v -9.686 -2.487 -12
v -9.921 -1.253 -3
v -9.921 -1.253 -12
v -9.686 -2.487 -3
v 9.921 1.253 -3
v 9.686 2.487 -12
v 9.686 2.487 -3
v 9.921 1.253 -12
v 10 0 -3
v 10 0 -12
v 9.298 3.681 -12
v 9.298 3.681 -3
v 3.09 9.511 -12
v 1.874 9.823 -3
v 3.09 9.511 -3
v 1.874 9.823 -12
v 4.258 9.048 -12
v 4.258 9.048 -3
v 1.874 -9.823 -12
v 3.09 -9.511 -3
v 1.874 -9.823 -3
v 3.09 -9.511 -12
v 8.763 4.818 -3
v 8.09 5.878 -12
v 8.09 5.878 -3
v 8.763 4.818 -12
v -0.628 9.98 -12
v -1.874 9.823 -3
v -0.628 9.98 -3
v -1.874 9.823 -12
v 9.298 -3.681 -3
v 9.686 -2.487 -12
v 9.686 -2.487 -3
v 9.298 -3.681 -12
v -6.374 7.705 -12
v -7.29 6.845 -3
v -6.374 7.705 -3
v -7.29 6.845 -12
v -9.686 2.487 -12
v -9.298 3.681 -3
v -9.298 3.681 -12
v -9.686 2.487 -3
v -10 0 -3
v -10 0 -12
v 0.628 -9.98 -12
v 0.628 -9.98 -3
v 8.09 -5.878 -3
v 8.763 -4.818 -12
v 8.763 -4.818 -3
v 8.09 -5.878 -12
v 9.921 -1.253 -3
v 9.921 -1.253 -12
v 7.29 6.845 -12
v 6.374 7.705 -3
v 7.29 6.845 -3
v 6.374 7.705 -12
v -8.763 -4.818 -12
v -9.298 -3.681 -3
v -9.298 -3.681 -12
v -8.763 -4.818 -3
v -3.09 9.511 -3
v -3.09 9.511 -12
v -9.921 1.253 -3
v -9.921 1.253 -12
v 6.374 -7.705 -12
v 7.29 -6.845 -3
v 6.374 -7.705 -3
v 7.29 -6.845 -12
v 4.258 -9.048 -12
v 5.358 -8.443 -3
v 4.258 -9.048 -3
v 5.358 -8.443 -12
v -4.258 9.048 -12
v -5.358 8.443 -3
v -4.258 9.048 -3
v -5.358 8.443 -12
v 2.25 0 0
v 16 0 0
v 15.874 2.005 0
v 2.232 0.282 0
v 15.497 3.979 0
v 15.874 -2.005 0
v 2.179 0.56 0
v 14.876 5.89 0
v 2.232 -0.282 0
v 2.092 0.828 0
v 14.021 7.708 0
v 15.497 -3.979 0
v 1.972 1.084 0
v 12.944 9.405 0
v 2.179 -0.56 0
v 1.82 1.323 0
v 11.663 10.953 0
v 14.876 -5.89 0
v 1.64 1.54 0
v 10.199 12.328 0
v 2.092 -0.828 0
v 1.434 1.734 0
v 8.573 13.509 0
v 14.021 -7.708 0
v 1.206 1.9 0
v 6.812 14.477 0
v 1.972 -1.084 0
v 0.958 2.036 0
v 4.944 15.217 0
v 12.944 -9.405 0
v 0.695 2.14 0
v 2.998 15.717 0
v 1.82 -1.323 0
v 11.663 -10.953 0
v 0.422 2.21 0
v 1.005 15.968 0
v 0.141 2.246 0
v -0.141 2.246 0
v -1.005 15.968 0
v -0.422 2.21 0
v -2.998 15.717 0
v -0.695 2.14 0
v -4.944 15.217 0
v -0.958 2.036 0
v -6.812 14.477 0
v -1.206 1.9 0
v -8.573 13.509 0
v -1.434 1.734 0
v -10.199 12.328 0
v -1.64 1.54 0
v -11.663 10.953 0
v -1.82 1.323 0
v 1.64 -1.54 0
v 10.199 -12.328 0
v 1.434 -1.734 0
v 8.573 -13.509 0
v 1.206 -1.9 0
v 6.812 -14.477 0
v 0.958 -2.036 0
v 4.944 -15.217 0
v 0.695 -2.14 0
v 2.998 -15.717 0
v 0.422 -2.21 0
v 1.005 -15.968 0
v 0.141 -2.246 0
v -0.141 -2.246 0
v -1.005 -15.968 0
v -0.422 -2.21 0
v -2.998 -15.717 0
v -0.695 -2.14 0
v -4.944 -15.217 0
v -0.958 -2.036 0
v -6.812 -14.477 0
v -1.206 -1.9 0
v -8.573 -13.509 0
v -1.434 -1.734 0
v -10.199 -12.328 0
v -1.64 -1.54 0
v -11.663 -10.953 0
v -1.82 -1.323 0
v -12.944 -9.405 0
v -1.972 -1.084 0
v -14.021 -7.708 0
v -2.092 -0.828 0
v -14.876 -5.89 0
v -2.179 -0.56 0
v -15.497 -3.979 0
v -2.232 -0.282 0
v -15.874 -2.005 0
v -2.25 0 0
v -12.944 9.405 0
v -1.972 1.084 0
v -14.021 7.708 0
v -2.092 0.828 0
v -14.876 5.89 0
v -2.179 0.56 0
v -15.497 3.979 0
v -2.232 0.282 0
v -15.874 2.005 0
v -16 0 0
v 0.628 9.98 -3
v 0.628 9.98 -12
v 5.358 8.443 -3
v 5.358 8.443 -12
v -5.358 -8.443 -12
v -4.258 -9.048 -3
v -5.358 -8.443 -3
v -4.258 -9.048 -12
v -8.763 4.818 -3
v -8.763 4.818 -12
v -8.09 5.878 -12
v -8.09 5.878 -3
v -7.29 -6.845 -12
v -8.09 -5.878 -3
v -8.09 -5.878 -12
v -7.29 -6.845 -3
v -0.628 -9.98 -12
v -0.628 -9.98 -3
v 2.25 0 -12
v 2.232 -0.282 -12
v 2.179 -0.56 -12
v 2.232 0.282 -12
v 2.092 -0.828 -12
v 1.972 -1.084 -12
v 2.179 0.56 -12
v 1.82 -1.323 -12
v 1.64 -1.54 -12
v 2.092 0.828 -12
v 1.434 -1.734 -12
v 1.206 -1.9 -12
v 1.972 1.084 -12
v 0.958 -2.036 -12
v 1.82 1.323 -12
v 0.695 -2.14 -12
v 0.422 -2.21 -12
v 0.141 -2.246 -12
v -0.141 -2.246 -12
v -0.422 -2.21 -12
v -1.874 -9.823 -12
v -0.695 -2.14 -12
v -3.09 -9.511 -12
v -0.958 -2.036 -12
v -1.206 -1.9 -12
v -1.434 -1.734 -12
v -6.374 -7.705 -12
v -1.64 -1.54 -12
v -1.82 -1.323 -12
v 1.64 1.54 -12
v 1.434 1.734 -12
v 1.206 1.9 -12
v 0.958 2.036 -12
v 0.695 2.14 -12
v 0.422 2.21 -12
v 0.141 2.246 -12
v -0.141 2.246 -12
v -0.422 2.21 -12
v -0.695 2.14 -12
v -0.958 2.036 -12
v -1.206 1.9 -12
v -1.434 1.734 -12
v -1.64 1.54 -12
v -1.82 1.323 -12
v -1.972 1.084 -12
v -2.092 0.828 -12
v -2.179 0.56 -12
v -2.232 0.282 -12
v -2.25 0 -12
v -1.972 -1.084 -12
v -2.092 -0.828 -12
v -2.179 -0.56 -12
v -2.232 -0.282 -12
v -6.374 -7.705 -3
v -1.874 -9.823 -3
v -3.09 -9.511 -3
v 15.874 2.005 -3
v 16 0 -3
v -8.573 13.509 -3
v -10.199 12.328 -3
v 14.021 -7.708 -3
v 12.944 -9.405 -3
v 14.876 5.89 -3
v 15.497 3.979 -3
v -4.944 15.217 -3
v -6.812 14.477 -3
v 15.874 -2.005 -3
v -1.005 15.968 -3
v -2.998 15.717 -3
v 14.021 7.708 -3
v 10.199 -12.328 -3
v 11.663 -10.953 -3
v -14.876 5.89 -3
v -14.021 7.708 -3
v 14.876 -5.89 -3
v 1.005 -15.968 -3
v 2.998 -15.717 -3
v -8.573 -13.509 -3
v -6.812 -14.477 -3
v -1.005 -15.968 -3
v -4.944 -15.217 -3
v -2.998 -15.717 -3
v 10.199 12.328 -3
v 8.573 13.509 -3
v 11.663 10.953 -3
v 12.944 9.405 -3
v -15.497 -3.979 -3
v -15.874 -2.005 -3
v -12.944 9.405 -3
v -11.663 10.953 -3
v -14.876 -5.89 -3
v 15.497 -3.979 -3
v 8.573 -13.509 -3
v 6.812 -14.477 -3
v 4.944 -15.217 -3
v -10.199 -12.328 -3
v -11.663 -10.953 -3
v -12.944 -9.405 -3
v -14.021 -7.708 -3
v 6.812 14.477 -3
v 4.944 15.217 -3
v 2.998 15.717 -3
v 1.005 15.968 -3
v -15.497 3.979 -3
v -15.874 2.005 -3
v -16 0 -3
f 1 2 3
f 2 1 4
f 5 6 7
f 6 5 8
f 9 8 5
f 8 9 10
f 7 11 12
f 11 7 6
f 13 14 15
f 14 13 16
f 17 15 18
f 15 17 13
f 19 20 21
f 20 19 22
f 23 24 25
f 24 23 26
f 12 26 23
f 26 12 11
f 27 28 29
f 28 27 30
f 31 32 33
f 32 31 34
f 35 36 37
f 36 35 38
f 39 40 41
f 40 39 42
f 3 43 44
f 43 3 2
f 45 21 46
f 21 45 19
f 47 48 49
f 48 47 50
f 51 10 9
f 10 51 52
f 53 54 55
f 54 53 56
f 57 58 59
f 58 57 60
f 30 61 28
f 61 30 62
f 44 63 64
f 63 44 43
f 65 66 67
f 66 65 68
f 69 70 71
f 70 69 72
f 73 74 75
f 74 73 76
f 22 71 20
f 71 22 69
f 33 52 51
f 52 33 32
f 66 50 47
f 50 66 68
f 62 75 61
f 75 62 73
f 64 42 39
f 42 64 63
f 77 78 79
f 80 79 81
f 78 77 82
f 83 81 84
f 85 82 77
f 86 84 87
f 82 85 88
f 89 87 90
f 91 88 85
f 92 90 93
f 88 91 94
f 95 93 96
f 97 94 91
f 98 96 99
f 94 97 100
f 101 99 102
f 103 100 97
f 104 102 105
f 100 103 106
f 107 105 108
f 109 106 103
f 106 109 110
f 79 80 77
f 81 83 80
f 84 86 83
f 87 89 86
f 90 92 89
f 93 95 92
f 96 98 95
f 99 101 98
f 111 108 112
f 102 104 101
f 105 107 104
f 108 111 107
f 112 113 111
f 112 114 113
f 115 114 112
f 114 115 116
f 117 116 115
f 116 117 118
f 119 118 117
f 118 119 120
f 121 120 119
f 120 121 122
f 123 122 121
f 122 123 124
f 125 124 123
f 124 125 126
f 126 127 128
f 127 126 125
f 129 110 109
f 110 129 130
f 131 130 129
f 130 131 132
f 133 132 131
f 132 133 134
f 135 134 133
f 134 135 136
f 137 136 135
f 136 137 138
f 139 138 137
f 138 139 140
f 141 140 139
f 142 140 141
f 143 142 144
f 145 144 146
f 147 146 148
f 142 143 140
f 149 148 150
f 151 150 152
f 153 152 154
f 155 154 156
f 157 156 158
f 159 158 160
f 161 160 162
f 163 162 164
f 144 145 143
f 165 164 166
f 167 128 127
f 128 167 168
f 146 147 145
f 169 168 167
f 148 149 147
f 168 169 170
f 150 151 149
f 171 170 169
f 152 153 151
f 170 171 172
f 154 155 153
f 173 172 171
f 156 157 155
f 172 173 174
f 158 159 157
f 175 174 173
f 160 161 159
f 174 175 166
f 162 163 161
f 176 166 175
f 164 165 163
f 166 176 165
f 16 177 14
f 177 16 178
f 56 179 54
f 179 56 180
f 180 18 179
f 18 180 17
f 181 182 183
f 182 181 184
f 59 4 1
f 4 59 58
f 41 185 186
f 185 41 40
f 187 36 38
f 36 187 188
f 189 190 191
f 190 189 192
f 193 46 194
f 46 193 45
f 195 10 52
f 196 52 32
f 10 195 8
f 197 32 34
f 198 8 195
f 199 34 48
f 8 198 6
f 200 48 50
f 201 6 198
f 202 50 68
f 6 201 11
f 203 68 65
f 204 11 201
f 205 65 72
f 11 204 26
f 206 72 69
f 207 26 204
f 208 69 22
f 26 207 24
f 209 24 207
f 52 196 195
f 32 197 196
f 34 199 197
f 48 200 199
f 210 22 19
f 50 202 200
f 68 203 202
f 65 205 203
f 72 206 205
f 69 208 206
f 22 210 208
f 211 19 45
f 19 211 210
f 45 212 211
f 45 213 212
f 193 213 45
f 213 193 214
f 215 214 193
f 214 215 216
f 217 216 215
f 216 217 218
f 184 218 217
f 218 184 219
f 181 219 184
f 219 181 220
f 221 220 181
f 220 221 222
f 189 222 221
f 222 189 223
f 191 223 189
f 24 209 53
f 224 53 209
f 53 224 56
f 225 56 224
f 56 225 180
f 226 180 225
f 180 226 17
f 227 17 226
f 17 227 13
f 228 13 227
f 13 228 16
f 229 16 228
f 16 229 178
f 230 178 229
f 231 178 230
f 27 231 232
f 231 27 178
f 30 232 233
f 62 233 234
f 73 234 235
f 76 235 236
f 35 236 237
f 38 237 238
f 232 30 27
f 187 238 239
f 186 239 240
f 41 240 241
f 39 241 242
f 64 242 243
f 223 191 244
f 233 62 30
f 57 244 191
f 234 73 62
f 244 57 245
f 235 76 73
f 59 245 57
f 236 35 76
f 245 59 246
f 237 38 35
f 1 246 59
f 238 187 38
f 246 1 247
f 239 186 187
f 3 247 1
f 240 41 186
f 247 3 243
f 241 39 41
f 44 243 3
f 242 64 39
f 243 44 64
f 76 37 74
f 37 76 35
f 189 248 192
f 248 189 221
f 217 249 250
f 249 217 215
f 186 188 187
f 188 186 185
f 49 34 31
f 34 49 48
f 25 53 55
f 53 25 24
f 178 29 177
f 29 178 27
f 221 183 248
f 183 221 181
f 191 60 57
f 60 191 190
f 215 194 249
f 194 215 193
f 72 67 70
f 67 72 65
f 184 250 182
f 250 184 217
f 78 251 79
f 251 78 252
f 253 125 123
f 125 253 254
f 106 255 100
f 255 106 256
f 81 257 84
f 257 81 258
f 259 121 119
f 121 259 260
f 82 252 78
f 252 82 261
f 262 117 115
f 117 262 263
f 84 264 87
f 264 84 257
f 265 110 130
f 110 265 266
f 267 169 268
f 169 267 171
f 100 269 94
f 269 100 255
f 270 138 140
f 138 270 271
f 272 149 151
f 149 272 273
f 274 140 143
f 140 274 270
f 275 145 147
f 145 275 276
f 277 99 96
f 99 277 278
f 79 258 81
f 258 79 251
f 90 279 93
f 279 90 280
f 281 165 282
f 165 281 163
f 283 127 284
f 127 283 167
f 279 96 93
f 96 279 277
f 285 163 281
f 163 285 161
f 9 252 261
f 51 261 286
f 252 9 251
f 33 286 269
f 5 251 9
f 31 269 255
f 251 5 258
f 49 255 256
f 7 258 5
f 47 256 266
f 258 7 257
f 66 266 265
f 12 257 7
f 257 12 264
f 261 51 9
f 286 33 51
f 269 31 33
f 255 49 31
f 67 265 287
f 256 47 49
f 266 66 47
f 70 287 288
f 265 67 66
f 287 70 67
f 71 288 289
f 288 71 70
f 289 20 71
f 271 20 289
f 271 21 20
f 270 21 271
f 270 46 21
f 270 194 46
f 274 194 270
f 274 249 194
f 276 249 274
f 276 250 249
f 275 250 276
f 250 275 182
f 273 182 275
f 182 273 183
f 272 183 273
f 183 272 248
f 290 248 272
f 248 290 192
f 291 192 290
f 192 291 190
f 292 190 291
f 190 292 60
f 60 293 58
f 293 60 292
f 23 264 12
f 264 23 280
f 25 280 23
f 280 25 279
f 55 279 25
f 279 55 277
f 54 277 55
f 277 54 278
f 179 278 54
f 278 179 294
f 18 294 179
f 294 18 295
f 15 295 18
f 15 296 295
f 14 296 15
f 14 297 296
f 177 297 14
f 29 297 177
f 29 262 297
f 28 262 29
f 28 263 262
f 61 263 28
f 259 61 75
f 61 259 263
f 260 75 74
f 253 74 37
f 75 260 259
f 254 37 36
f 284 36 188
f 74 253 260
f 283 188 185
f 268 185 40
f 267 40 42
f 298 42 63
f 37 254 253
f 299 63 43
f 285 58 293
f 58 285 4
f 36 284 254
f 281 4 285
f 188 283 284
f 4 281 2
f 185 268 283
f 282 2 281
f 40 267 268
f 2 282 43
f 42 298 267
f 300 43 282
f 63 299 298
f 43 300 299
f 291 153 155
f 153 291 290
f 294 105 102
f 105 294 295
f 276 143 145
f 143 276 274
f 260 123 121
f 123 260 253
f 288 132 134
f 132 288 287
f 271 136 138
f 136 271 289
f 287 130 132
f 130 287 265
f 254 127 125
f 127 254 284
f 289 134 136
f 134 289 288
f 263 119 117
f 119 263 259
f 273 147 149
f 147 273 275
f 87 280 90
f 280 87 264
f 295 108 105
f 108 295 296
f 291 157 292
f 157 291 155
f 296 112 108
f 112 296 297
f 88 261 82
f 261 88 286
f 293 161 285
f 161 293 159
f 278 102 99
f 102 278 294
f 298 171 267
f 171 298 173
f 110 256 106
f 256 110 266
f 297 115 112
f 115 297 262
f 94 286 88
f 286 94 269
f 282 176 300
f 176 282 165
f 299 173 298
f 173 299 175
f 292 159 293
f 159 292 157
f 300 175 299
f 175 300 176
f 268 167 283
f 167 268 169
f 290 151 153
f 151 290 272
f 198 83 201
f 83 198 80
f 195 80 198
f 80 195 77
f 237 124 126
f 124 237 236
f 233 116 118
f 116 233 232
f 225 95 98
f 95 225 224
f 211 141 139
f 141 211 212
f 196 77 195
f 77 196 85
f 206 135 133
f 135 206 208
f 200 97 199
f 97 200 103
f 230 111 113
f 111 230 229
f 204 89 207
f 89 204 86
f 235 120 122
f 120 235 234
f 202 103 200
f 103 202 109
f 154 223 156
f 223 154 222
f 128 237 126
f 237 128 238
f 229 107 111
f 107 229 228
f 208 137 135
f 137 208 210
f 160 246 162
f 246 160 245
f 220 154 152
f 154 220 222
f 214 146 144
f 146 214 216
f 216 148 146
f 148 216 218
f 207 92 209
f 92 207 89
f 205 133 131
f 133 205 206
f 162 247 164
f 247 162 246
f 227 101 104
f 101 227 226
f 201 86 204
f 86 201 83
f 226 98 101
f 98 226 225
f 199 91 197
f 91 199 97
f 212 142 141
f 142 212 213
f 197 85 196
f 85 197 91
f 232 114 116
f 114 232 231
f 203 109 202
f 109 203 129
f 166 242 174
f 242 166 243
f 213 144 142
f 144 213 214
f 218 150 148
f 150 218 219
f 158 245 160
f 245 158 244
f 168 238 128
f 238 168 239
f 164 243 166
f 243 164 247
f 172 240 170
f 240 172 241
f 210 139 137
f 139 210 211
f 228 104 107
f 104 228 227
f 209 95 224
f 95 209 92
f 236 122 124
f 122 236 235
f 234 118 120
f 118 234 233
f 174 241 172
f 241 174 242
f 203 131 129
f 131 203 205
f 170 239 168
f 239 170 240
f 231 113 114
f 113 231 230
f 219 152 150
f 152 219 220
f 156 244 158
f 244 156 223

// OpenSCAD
$fn = 50;


difference() {
	union() {
		translate(v = [0, 0, -12.0000000000]) {
			cylinder(h = 12, r = 10.0000000000);
		}
		translate(v = [0, 0, -3.0000000000]) {
			cylinder(h = 3, r = 16.0000000000);
		}
	}
	union() {
		#translate(v = [0, 0, -12]) {
			cylinder(h = 12, r = 2.2500000000);
		}
	}
}
